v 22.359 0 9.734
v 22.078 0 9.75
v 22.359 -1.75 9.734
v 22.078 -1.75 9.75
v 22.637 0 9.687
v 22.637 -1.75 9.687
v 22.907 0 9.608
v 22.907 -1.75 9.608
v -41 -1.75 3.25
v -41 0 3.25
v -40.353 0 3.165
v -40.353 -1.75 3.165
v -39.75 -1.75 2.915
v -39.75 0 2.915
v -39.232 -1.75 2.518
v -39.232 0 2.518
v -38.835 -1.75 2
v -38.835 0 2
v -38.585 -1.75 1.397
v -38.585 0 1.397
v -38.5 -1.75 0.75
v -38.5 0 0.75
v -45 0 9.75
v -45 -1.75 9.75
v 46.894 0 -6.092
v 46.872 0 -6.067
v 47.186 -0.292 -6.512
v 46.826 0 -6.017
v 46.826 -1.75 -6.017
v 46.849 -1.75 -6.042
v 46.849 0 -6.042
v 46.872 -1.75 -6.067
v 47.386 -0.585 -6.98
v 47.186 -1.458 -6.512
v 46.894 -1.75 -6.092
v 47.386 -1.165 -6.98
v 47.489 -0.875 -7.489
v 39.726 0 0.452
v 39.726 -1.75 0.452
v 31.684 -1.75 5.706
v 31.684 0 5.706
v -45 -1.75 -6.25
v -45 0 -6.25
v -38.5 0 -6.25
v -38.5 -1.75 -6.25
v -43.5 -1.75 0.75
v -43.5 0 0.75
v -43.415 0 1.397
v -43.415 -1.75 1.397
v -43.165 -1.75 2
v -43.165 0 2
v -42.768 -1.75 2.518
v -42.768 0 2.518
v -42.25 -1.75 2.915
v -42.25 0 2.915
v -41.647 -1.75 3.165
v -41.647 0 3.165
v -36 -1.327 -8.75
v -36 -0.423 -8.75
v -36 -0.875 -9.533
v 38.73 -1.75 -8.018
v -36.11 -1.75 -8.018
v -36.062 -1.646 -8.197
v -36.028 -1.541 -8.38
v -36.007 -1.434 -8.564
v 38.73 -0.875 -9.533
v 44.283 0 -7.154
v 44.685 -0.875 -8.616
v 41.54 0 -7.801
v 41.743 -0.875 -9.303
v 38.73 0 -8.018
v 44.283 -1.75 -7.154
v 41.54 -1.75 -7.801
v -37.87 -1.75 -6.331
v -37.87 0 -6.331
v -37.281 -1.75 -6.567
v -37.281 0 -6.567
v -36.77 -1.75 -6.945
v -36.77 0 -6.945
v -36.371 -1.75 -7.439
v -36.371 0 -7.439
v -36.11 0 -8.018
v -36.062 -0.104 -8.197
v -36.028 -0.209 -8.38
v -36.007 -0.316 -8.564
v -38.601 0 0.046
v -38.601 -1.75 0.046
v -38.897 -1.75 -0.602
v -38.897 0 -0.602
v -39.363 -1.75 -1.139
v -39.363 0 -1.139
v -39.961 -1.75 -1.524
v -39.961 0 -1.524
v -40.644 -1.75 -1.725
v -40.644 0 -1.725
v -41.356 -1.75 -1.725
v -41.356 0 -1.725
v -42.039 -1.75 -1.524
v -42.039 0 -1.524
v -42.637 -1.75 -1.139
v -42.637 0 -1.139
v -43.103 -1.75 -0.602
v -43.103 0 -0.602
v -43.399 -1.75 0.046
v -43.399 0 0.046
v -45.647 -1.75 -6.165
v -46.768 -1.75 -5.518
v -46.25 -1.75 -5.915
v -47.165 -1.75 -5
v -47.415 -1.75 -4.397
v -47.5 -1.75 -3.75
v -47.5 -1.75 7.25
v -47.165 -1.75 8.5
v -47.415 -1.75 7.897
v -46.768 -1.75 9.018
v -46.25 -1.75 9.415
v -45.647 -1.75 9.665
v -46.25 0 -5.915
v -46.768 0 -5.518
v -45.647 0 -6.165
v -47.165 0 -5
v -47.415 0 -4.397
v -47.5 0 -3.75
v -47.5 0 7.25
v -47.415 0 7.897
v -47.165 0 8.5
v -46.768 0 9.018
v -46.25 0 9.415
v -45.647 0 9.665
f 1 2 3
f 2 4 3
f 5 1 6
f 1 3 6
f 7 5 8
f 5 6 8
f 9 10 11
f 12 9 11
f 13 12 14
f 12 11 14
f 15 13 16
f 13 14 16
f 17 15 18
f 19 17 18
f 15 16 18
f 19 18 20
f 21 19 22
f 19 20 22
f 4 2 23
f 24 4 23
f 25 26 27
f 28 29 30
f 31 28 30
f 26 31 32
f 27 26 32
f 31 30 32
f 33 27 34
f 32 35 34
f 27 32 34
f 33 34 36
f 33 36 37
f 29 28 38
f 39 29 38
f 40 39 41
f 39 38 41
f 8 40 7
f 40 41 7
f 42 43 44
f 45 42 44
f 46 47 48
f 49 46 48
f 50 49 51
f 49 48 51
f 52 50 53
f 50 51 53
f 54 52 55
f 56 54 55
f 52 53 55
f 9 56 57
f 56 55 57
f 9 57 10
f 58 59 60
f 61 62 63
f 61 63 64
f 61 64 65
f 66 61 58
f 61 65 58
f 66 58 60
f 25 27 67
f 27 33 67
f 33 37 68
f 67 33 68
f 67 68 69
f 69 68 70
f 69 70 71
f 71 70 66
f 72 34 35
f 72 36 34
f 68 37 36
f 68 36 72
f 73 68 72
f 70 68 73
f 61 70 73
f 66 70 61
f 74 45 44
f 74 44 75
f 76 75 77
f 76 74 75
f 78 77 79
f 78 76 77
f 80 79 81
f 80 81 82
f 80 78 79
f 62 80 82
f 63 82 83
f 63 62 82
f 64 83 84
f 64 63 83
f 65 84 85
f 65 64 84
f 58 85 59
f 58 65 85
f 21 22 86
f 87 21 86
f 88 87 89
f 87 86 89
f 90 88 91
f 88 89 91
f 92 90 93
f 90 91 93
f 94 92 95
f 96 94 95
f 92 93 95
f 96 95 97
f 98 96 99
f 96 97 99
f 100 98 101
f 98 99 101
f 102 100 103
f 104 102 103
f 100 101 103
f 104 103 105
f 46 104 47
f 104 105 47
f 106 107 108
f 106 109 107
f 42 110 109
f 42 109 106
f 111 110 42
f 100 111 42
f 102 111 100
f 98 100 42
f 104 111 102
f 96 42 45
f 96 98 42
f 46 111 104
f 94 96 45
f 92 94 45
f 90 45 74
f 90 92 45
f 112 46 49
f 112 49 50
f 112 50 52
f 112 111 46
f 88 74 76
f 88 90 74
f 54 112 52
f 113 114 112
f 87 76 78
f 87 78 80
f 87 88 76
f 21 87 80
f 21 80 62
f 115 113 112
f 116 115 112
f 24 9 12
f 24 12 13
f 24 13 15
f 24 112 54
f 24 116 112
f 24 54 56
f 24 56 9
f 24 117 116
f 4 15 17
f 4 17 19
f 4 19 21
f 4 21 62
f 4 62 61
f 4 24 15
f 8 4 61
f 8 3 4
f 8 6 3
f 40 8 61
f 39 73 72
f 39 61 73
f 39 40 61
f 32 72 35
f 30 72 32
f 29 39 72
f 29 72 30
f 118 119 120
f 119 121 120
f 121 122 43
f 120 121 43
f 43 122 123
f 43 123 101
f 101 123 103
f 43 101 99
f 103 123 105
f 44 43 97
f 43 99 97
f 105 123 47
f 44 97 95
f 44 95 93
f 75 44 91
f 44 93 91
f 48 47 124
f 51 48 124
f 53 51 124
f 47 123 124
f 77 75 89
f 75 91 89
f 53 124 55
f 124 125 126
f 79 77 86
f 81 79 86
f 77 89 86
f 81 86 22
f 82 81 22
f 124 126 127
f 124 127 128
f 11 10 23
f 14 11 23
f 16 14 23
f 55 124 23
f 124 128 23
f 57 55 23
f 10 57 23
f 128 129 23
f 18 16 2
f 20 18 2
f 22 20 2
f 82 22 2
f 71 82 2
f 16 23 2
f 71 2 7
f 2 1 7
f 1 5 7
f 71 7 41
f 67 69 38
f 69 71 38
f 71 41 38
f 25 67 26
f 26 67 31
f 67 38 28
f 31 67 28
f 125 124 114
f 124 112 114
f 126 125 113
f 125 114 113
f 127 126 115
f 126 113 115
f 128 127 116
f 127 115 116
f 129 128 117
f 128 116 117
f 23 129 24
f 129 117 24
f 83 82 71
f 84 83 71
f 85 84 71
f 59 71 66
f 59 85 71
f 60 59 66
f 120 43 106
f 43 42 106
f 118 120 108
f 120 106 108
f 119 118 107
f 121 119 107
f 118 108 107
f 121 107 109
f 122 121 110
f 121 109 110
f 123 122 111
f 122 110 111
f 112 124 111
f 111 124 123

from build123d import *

# Parameters (mm, degrees)
F1_DEPTH    = 1.75
F2_F1_R     = 2.5
F2_F2_R     = 2.5
F3_T1_DEPTH = 45.6015639847
F4_T1_DEPTH = 79.2106511737
F4_T4_ANGLE = 38.8466581594
F4_T6_ANGLE = 38.8466581594


# Not quite as in the source:
# - a fillet or chamfer that OpenCascade refuses, or shapes differently, is made with other operations: its cross-section is extruded or revolved along the edge and cut away or added


with BuildPart() as f1:
    # F0 (on Front) → F1 (new body)
    with BuildSketch(Plane.XZ):
        with BuildLine():
            Line((-47.5, -6.25), (-36, -6.25))
            Line((-36, -6.25), (-36, 9.75))
            Line((-36, 9.75), (-41, 9.75))
            Line((-41, 9.75), (-41, 3.25))
            ThreePointArc((-41, 3.25), (-39.232233047, 2.517766953), (-38.5, 0.75))
            ThreePointArc((-38.5, 0.75), (-41, -1.75), (-43.5, 0.75))
            Line((-43.5, 0.75), (-47.5, 0.75))
            Line((-47.5, 0.75), (-47.5, -6.25))
        make_face()
        with BuildLine():
            Line((-36, -9.75), (47.5, -9.75))
            Line((47.5, -9.75), (47.5, -6.75))
            ThreePointArc((47.5, -6.75), (36.0462328118, 3.08520123), (22.5, 9.75))
            Line((22.5, 9.75), (-36, 9.75))
            Line((-36, 9.75), (-36, -6.25))
            Line((-36, -6.25), (-36, -9.75))
        make_face()
        with BuildLine():
            Line((-47.5, 9.75), (-47.5, 0.75))
            Line((-47.5, 0.75), (-43.5, 0.75))
            ThreePointArc((-43.5, 0.75), (-42.767766953, 2.517766953), (-41, 3.25))
            Line((-41, 3.25), (-41, 9.75))
            Line((-41, 9.75), (-47.5, 9.75))
        make_face()
    extrude(amount=F1_DEPTH)

    # F2: fillet of radius 2.5 on 5 edges, made by hand

    # F2_f1
    f2_f1_edges = [f1.edges().sort_by_distance(p)[0] for p in [
        (-36, -0.875, -6.25),
    ]]
    fillet(f2_f1_edges, radius=F2_F1_R)

    # F2_f2
    f2_f2_edges = [f1.edges().sort_by_distance(p)[0] for p in [
        (-47.5, -0.875, -6.25),
        (-47.5, -0.875, 9.75),
        (22.5, -0.875, 9.75),
        (47.5, -0.875, -6.75),
    ]]
    fillet(f2_f2_edges, radius=F2_F2_R)

    # F3: fillet of radius 20 on 1 edges, made by hand

    # F3_s2 → F3_t1 (cut)
    with BuildSketch(Plane.XZ.offset(-21.9257819924)):
        with BuildLine():
            ThreePointArc((38.7296872031, -9.75), (43.2302747659, -9.2370395799), (47.5, -7.7244711589))
            Line((47.5, -7.7244711589), (47.5, -9.75))
            Line((47.5, -9.75), (38.7296872031, -9.75))
        make_face()
    extrude(amount=F3_T1_DEPTH, mode=Mode.SUBTRACT)

    # F4: chamfer of 1 x 1.7320508076 on 4 edges, made by hand

    # F4_s2 → F4_t1 (cut)
    with BuildSketch(Plane.YZ.offset(-40.4809639706)):
        Polygon((-1.75, -8.0179491924), (-0.75, -9.75), (-1.75, -9.75), align=None)
        Polygon((0, -8.0179491924), (-1, -9.75), (0, -9.75), align=None)
    extrude(amount=F4_T1_DEPTH, mode=Mode.SUBTRACT)

    # F4_s3 → F4_t4 (revolve, cut)
    with BuildSketch(Plane(origin=(28.4995819615, 0, 22.9524885444), x_dir=(0, 1, 0), z_dir=(0.778827439, 0, 0.6272382484))):
        Polygon((0, -34.577709107), (-1, -36.3097599146), (0, -36.3097599146), align=None)
    revolve(axis=Axis((38.729687203, 0, 10.2499999998), (0, 1, 0)), revolution_arc=F4_T4_ANGLE, mode=Mode.SUBTRACT)

    # F4_s5 → F4_t6 (revolve, cut)
    with BuildSketch(Plane(origin=(28.4995819615, 0, 22.9524885444), x_dir=(0, 1, 0), z_dir=(0.778827439, 0, 0.6272382484))):
        Polygon((-1.75, -34.577709107), (-0.75, -36.3097599146), (-1.75, -36.3097599146), align=None)
    revolve(axis=Axis((38.729687203, -1.75, 10.2499999998), (0, 1, 0)), revolution_arc=F4_T6_ANGLE, mode=Mode.SUBTRACT)


solid = f1.part
